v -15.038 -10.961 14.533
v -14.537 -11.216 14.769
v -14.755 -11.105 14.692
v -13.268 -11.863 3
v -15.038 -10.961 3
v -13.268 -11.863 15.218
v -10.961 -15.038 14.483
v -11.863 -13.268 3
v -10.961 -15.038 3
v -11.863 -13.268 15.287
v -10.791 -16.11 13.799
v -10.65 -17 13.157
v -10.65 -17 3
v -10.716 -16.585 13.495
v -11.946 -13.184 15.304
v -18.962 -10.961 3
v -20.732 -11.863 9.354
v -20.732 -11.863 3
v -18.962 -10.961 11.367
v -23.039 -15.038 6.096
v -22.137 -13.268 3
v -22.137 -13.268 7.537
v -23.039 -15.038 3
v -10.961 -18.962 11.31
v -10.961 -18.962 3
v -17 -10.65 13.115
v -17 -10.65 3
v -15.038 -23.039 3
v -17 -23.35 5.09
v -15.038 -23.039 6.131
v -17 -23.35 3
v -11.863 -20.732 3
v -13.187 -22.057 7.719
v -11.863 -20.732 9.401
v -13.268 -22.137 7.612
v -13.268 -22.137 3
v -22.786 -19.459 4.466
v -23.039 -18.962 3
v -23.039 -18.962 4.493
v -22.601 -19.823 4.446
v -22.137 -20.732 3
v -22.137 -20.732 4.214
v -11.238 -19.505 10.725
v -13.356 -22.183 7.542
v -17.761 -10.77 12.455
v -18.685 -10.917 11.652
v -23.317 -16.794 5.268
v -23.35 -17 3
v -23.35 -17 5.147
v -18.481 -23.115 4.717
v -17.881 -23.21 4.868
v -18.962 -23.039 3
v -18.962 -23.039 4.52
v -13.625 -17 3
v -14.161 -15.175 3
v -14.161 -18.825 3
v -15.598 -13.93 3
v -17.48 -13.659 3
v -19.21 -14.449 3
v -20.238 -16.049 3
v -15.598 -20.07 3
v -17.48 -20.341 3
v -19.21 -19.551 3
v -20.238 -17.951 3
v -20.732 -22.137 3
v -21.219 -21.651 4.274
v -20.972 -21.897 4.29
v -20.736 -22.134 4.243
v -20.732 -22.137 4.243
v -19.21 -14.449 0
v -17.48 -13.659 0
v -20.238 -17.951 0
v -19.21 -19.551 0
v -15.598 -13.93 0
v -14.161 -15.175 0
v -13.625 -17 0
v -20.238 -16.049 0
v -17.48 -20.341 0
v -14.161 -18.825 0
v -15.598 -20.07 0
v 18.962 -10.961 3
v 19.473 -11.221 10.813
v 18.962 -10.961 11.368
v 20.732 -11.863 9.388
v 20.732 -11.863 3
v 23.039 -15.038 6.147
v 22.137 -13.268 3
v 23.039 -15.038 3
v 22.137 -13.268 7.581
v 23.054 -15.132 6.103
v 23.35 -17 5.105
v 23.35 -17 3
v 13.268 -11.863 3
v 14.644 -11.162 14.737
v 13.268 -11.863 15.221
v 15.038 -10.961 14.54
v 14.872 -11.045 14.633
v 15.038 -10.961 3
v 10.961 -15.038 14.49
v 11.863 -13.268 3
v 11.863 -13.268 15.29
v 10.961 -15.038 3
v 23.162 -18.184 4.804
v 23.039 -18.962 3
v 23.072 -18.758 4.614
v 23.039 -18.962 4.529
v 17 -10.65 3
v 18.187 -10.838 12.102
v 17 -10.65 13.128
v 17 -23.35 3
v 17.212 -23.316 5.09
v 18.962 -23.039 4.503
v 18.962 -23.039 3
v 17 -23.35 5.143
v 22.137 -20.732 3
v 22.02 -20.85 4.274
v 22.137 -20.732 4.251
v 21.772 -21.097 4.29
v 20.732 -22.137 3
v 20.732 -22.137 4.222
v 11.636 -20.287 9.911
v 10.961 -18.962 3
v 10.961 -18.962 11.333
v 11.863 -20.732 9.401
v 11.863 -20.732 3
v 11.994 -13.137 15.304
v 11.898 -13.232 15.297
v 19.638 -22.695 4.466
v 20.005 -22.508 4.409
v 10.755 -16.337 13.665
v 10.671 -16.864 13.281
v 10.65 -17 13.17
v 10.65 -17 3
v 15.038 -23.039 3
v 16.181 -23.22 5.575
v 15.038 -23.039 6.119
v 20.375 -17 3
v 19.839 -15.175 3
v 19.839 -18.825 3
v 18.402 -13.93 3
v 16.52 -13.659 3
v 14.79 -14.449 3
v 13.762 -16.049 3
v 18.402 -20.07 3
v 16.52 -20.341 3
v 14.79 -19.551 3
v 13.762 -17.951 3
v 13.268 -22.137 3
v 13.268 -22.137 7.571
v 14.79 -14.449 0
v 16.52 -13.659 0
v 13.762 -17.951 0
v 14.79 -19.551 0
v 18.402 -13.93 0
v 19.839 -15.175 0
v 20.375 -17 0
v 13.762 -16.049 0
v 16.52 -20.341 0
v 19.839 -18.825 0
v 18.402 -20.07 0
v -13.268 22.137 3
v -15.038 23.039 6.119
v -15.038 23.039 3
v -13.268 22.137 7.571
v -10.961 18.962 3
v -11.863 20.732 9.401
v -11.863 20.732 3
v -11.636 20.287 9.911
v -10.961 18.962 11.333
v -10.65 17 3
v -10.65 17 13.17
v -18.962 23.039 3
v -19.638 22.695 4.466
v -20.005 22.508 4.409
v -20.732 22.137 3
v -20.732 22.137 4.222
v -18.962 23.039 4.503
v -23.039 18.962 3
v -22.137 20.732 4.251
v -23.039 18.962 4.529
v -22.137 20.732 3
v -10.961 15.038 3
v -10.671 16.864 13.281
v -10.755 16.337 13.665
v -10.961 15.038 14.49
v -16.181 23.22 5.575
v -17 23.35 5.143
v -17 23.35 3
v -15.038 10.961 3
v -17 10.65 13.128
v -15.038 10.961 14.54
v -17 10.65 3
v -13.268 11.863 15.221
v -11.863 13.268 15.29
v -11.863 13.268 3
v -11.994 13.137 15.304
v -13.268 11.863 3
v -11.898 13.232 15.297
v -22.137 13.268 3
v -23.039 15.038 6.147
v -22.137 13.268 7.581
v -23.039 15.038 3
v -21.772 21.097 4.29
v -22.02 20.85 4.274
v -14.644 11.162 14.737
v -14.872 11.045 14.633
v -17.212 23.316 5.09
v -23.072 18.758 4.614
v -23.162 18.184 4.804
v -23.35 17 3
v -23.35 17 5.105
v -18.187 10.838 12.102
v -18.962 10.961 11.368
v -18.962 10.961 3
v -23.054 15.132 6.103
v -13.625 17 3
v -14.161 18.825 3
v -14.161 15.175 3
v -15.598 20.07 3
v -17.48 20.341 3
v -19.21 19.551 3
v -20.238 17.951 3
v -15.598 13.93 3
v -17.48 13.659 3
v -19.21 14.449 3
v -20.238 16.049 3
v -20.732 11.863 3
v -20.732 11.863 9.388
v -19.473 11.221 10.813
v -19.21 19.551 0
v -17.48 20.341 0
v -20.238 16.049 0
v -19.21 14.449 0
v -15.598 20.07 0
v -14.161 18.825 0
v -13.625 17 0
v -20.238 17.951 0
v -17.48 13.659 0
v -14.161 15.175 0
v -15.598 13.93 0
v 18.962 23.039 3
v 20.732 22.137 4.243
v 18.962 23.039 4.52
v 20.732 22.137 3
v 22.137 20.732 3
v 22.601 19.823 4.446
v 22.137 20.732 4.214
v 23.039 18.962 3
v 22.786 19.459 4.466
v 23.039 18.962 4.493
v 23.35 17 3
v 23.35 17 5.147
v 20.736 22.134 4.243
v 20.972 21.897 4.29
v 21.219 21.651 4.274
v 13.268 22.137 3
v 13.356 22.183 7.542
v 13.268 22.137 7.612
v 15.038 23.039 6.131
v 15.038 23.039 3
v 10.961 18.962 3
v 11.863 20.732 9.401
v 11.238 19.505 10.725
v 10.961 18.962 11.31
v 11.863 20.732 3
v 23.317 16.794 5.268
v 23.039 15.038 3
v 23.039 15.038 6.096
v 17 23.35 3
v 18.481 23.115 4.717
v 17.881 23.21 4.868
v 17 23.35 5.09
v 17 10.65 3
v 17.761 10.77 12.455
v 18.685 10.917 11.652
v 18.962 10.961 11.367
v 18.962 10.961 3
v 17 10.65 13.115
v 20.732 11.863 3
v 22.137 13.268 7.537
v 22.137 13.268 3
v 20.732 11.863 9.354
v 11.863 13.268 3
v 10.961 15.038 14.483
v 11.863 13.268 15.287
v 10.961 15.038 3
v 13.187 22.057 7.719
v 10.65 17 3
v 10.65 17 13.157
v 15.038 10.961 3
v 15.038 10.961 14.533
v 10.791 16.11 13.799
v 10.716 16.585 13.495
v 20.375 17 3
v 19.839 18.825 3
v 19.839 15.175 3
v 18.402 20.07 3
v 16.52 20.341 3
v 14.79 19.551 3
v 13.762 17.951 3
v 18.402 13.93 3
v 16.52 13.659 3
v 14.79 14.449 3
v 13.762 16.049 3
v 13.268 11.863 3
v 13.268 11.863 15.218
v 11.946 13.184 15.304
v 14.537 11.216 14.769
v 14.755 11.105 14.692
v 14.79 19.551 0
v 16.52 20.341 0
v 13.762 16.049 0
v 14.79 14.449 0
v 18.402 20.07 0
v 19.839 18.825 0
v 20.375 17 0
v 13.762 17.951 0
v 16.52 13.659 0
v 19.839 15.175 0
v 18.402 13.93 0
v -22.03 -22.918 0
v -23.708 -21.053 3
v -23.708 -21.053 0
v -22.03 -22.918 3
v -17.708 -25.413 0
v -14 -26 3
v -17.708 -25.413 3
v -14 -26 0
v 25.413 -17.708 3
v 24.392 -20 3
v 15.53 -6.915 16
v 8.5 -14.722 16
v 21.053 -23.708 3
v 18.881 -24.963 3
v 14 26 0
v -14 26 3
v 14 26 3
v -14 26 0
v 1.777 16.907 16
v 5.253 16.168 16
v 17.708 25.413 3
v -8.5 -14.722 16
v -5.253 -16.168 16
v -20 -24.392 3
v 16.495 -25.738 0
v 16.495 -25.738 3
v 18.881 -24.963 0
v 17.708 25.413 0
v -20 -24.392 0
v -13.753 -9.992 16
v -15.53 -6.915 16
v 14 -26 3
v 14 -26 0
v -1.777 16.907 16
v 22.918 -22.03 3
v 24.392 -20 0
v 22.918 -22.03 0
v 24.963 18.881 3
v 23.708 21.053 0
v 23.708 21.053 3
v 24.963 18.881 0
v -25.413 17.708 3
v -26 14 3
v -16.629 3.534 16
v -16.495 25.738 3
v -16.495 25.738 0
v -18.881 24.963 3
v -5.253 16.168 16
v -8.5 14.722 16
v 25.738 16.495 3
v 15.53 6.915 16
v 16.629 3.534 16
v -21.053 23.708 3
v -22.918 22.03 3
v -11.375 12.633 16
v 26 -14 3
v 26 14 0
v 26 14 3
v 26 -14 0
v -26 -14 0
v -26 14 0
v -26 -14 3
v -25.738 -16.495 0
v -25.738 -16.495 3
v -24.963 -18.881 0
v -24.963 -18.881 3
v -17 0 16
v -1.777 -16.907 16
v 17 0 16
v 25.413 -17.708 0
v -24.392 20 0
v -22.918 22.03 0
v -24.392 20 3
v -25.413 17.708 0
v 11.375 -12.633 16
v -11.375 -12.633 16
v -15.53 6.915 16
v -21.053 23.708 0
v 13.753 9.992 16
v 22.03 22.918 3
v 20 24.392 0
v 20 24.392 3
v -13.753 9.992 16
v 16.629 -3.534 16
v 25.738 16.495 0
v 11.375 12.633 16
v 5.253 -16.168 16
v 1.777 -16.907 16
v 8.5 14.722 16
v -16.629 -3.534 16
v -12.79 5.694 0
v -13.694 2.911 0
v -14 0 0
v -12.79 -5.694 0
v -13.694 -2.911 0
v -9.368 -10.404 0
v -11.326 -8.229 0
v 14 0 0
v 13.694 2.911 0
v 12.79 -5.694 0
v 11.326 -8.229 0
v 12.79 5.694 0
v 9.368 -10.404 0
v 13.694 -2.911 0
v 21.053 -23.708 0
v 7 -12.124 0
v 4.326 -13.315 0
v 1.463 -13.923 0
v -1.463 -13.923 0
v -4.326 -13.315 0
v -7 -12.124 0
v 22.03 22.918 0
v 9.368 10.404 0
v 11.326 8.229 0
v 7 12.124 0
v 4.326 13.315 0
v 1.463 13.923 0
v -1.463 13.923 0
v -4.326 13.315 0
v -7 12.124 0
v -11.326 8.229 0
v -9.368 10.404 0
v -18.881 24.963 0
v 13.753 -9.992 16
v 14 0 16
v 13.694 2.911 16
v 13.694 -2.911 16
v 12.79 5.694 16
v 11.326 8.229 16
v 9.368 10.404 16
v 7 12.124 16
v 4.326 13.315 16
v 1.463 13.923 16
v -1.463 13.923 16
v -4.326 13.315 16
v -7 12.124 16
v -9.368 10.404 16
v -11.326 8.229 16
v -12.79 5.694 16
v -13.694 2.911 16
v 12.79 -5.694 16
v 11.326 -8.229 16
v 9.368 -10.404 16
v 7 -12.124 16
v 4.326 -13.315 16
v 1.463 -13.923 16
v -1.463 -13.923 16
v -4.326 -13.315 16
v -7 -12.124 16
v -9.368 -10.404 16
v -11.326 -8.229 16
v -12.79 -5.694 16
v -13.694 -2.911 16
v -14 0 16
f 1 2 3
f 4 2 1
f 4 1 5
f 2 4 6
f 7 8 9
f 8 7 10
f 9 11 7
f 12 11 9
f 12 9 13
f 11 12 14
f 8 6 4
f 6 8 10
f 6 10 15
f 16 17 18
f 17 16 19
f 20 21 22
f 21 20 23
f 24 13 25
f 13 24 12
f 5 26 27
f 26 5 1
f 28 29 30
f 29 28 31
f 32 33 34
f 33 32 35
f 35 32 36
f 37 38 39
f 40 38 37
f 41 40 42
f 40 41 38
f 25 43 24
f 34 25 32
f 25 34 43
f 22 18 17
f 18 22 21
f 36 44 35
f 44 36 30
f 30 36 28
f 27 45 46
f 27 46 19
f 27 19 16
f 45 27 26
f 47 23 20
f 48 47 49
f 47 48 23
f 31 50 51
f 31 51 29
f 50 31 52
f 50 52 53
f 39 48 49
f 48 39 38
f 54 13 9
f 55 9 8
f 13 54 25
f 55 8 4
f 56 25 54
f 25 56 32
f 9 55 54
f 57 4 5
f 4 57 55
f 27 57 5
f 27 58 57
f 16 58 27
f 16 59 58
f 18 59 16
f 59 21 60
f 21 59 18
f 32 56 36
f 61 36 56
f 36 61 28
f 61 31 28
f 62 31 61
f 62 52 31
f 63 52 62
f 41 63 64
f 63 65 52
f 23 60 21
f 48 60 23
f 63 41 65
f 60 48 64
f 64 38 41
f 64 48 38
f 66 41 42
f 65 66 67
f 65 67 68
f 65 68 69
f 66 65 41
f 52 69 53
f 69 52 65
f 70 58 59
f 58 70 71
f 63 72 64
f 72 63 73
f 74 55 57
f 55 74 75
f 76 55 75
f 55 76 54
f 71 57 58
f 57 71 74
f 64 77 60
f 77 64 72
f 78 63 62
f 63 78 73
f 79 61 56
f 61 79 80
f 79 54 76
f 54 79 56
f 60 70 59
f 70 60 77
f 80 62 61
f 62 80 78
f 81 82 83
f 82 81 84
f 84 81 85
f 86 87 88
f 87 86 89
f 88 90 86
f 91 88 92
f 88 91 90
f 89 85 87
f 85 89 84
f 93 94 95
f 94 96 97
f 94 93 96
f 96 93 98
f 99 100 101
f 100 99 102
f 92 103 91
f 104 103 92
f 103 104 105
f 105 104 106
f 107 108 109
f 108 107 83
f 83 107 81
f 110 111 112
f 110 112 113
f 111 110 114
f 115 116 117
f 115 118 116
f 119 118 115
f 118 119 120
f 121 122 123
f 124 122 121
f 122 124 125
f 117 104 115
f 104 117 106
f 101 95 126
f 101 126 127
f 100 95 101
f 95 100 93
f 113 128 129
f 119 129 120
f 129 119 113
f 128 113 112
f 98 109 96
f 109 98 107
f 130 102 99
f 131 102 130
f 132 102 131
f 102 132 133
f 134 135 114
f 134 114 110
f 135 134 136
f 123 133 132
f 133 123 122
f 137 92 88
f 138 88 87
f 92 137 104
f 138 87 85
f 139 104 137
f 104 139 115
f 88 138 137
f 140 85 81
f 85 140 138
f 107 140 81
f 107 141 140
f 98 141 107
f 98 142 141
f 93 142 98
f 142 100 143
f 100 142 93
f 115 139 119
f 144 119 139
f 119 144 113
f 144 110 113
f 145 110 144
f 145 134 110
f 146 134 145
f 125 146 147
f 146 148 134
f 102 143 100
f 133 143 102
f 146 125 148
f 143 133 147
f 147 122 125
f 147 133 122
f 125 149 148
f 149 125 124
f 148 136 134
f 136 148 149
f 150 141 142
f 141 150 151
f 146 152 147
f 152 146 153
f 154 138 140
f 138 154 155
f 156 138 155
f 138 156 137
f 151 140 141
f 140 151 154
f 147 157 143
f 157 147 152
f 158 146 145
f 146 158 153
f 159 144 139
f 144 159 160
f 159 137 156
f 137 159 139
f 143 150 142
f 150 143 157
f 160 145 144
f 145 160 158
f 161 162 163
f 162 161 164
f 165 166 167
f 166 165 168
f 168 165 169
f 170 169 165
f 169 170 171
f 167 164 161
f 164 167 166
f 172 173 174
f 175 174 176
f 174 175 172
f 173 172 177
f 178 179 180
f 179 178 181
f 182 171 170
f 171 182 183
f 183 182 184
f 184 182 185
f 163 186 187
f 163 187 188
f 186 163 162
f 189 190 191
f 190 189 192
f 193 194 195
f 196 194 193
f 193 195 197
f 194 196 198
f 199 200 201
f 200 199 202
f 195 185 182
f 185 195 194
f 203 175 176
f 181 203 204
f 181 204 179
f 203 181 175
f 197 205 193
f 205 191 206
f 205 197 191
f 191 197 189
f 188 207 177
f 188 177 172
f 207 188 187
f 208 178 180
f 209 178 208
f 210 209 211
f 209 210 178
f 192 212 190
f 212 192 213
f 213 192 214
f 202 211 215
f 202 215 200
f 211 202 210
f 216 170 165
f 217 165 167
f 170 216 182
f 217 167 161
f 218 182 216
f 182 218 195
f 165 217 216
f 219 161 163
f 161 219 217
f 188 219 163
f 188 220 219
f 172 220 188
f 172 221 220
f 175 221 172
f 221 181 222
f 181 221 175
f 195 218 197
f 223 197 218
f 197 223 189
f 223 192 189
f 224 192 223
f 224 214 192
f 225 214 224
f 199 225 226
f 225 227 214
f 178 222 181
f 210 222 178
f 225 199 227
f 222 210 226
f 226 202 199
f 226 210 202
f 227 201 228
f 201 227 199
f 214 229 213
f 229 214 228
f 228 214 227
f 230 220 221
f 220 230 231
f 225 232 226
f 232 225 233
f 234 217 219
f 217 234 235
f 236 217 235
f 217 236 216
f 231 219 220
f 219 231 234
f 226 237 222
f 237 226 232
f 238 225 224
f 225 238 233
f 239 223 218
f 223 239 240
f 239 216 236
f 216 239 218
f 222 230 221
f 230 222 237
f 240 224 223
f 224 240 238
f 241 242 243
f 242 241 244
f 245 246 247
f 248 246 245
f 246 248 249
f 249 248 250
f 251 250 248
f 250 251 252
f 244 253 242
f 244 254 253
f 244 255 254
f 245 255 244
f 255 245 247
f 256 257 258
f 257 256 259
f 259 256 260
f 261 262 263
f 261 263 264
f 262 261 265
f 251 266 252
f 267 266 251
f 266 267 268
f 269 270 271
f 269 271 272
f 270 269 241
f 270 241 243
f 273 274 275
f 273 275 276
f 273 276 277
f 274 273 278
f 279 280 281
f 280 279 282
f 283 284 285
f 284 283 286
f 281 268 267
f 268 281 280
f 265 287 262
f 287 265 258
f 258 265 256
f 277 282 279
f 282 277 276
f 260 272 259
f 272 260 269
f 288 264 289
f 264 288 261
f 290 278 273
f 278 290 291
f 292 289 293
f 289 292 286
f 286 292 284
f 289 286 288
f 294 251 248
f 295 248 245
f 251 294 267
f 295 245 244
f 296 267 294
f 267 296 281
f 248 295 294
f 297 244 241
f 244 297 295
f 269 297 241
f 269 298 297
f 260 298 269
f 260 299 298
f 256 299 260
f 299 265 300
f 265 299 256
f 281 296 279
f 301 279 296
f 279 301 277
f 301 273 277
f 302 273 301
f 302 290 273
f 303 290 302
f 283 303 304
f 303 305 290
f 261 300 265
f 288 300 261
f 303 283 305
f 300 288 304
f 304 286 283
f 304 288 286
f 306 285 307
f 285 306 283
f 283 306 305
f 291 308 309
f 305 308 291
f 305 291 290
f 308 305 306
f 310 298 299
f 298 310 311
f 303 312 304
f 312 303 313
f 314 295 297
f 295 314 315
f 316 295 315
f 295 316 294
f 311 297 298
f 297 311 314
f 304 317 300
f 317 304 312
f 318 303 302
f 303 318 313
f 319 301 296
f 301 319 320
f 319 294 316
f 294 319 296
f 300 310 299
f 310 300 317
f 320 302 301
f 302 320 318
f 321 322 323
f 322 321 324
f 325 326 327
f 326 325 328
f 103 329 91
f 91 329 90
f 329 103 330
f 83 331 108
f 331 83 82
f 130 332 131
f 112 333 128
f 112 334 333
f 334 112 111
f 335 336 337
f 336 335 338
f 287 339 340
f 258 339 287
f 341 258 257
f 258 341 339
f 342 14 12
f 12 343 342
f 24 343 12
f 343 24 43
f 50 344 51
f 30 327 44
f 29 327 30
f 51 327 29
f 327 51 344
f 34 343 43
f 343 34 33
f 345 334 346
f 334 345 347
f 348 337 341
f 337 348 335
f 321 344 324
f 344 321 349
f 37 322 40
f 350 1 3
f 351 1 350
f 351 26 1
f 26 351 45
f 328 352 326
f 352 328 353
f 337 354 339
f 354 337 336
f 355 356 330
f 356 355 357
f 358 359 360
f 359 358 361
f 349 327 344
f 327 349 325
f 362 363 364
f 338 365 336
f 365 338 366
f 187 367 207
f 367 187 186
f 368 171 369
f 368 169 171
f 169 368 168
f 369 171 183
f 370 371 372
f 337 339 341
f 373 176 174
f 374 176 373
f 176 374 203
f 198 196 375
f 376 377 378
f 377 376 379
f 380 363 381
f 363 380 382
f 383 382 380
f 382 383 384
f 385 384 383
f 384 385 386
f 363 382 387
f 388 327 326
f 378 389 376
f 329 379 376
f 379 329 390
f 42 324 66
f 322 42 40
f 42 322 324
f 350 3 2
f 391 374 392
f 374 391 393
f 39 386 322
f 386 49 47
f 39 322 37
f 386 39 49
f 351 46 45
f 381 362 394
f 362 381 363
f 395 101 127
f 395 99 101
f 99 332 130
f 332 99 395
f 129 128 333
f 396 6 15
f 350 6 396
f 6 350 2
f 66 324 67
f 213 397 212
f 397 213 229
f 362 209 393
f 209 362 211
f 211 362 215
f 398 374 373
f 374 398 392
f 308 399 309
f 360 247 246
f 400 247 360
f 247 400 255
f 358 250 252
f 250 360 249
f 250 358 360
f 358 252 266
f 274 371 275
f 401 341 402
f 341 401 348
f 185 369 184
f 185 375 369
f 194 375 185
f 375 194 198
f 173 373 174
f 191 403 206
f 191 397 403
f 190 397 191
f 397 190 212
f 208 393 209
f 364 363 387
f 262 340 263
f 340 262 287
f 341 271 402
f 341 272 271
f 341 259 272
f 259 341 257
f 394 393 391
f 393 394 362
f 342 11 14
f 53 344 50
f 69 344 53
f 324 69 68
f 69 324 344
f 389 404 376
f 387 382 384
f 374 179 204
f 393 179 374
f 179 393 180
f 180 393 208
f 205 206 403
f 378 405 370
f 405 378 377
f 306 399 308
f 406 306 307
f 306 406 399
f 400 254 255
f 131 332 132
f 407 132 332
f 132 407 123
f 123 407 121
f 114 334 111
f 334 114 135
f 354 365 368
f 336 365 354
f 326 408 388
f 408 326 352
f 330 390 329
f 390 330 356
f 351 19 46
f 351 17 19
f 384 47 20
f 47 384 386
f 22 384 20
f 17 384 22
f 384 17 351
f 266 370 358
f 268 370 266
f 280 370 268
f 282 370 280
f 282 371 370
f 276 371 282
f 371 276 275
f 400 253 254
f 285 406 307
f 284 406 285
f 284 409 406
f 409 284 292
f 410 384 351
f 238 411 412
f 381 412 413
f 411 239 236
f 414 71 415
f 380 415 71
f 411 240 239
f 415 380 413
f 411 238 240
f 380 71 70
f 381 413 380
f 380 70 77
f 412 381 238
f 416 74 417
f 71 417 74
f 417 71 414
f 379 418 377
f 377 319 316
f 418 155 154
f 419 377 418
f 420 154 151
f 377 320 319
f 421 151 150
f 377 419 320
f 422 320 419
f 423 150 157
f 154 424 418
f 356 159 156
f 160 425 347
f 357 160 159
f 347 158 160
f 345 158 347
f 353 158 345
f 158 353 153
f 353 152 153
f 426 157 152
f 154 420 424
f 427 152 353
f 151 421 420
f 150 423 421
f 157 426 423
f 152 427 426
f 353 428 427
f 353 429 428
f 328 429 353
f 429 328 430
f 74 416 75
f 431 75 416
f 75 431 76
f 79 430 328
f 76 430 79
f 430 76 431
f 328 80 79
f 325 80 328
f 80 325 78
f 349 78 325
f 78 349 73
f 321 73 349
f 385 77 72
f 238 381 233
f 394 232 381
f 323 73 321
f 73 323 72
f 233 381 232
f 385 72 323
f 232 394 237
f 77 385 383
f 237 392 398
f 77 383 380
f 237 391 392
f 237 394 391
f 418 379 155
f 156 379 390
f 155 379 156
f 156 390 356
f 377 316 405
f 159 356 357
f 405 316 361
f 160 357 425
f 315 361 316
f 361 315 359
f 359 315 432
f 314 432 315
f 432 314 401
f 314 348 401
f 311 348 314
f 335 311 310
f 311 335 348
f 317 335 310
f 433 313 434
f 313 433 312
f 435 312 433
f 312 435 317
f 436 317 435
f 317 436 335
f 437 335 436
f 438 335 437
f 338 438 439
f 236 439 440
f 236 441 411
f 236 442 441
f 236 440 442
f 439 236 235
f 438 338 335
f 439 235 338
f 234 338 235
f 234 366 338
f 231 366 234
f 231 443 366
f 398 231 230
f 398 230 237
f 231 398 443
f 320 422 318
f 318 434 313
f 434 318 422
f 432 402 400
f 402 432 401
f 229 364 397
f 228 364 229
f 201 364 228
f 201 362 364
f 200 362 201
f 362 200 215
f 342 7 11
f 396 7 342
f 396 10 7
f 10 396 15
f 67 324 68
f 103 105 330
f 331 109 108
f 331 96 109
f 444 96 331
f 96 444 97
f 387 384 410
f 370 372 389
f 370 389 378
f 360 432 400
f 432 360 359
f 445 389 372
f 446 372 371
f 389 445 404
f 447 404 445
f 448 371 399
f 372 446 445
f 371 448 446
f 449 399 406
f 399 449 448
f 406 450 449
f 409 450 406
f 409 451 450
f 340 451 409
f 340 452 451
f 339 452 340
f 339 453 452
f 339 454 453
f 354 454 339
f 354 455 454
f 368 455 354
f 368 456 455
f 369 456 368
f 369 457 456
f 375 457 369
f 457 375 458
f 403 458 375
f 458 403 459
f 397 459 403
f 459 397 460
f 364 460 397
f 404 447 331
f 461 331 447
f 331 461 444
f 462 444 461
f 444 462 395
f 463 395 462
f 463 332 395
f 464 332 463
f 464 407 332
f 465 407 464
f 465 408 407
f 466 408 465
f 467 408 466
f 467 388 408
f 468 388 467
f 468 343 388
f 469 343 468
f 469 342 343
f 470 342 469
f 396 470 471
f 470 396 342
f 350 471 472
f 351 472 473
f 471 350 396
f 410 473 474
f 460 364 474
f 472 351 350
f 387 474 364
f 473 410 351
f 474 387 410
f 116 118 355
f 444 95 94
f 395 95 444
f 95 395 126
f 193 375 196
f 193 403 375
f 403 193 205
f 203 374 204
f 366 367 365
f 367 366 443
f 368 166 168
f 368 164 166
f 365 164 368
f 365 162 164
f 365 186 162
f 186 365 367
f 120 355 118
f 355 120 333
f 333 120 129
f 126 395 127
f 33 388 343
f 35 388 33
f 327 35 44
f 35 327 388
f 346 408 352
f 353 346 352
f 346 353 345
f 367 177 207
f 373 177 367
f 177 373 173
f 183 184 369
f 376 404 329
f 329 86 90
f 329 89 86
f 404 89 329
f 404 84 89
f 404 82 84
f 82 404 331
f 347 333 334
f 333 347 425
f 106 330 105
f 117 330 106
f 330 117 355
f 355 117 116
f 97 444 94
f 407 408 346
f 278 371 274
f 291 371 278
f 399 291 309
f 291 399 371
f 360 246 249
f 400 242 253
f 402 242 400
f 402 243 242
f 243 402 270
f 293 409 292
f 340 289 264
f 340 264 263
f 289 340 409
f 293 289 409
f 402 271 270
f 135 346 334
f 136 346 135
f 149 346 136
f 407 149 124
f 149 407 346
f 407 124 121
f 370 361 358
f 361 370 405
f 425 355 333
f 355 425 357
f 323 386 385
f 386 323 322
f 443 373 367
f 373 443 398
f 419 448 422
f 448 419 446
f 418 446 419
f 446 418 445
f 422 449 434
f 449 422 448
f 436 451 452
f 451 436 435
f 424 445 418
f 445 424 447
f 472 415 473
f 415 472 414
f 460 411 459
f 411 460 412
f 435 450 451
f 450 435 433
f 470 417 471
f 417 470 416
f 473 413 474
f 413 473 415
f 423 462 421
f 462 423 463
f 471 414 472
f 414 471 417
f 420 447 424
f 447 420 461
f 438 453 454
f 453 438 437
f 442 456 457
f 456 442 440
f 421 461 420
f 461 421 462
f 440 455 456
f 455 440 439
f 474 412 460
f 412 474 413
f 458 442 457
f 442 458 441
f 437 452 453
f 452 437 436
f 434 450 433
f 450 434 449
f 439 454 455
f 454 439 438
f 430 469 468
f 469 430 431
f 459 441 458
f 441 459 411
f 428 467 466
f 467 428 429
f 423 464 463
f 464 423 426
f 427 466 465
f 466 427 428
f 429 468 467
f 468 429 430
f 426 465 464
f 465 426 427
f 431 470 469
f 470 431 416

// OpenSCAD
//OD of 3/4 pvc is 27mm +1for learance = 28
module pipeLegBracket(dia) {
        difference() {
            hull() {
                translate([0,0,dia/2])
                cylinder(h=2, d= dia+6);
                linear_extrude(3)
                offset(r=12)
                square(dia, center=true);
            }
            translate([0,0,-1])
            cylinder(h=dia+2, d=dia);
            translate([-dia/2-3, -dia/2-3,3])
            screwHole(6.75,12.7, 29);
            translate([dia/2+3, -dia/2-3,3])
            screwHole(6.75,12.7, 29);
            translate([-dia/2-3, dia/2+3,3])
            screwHole(6.75,12.7, 29);
            translate([dia/2+3, dia/2+3,3])
            screwHole(6.75,12.7, 29);
        }
}

//1/4 free clear hole is 6.75mm ish
//head is 12.7 ish
module screwHole(body, head, ht, countersink = false) {
    if (countersink==true) {
        cylinder(h=3, d1=body, d2=head);
        translate([0,0,2.9])
        cylinder(h=ht-2, d=head);
    } else {
        cylinder(h=ht, d=head);
    }
    translate([0,0,-4])
    cylinder(h=5, d=body);
    
}
pipeLegBracket(28);
//screwHole(6.75,12.7, 29);
